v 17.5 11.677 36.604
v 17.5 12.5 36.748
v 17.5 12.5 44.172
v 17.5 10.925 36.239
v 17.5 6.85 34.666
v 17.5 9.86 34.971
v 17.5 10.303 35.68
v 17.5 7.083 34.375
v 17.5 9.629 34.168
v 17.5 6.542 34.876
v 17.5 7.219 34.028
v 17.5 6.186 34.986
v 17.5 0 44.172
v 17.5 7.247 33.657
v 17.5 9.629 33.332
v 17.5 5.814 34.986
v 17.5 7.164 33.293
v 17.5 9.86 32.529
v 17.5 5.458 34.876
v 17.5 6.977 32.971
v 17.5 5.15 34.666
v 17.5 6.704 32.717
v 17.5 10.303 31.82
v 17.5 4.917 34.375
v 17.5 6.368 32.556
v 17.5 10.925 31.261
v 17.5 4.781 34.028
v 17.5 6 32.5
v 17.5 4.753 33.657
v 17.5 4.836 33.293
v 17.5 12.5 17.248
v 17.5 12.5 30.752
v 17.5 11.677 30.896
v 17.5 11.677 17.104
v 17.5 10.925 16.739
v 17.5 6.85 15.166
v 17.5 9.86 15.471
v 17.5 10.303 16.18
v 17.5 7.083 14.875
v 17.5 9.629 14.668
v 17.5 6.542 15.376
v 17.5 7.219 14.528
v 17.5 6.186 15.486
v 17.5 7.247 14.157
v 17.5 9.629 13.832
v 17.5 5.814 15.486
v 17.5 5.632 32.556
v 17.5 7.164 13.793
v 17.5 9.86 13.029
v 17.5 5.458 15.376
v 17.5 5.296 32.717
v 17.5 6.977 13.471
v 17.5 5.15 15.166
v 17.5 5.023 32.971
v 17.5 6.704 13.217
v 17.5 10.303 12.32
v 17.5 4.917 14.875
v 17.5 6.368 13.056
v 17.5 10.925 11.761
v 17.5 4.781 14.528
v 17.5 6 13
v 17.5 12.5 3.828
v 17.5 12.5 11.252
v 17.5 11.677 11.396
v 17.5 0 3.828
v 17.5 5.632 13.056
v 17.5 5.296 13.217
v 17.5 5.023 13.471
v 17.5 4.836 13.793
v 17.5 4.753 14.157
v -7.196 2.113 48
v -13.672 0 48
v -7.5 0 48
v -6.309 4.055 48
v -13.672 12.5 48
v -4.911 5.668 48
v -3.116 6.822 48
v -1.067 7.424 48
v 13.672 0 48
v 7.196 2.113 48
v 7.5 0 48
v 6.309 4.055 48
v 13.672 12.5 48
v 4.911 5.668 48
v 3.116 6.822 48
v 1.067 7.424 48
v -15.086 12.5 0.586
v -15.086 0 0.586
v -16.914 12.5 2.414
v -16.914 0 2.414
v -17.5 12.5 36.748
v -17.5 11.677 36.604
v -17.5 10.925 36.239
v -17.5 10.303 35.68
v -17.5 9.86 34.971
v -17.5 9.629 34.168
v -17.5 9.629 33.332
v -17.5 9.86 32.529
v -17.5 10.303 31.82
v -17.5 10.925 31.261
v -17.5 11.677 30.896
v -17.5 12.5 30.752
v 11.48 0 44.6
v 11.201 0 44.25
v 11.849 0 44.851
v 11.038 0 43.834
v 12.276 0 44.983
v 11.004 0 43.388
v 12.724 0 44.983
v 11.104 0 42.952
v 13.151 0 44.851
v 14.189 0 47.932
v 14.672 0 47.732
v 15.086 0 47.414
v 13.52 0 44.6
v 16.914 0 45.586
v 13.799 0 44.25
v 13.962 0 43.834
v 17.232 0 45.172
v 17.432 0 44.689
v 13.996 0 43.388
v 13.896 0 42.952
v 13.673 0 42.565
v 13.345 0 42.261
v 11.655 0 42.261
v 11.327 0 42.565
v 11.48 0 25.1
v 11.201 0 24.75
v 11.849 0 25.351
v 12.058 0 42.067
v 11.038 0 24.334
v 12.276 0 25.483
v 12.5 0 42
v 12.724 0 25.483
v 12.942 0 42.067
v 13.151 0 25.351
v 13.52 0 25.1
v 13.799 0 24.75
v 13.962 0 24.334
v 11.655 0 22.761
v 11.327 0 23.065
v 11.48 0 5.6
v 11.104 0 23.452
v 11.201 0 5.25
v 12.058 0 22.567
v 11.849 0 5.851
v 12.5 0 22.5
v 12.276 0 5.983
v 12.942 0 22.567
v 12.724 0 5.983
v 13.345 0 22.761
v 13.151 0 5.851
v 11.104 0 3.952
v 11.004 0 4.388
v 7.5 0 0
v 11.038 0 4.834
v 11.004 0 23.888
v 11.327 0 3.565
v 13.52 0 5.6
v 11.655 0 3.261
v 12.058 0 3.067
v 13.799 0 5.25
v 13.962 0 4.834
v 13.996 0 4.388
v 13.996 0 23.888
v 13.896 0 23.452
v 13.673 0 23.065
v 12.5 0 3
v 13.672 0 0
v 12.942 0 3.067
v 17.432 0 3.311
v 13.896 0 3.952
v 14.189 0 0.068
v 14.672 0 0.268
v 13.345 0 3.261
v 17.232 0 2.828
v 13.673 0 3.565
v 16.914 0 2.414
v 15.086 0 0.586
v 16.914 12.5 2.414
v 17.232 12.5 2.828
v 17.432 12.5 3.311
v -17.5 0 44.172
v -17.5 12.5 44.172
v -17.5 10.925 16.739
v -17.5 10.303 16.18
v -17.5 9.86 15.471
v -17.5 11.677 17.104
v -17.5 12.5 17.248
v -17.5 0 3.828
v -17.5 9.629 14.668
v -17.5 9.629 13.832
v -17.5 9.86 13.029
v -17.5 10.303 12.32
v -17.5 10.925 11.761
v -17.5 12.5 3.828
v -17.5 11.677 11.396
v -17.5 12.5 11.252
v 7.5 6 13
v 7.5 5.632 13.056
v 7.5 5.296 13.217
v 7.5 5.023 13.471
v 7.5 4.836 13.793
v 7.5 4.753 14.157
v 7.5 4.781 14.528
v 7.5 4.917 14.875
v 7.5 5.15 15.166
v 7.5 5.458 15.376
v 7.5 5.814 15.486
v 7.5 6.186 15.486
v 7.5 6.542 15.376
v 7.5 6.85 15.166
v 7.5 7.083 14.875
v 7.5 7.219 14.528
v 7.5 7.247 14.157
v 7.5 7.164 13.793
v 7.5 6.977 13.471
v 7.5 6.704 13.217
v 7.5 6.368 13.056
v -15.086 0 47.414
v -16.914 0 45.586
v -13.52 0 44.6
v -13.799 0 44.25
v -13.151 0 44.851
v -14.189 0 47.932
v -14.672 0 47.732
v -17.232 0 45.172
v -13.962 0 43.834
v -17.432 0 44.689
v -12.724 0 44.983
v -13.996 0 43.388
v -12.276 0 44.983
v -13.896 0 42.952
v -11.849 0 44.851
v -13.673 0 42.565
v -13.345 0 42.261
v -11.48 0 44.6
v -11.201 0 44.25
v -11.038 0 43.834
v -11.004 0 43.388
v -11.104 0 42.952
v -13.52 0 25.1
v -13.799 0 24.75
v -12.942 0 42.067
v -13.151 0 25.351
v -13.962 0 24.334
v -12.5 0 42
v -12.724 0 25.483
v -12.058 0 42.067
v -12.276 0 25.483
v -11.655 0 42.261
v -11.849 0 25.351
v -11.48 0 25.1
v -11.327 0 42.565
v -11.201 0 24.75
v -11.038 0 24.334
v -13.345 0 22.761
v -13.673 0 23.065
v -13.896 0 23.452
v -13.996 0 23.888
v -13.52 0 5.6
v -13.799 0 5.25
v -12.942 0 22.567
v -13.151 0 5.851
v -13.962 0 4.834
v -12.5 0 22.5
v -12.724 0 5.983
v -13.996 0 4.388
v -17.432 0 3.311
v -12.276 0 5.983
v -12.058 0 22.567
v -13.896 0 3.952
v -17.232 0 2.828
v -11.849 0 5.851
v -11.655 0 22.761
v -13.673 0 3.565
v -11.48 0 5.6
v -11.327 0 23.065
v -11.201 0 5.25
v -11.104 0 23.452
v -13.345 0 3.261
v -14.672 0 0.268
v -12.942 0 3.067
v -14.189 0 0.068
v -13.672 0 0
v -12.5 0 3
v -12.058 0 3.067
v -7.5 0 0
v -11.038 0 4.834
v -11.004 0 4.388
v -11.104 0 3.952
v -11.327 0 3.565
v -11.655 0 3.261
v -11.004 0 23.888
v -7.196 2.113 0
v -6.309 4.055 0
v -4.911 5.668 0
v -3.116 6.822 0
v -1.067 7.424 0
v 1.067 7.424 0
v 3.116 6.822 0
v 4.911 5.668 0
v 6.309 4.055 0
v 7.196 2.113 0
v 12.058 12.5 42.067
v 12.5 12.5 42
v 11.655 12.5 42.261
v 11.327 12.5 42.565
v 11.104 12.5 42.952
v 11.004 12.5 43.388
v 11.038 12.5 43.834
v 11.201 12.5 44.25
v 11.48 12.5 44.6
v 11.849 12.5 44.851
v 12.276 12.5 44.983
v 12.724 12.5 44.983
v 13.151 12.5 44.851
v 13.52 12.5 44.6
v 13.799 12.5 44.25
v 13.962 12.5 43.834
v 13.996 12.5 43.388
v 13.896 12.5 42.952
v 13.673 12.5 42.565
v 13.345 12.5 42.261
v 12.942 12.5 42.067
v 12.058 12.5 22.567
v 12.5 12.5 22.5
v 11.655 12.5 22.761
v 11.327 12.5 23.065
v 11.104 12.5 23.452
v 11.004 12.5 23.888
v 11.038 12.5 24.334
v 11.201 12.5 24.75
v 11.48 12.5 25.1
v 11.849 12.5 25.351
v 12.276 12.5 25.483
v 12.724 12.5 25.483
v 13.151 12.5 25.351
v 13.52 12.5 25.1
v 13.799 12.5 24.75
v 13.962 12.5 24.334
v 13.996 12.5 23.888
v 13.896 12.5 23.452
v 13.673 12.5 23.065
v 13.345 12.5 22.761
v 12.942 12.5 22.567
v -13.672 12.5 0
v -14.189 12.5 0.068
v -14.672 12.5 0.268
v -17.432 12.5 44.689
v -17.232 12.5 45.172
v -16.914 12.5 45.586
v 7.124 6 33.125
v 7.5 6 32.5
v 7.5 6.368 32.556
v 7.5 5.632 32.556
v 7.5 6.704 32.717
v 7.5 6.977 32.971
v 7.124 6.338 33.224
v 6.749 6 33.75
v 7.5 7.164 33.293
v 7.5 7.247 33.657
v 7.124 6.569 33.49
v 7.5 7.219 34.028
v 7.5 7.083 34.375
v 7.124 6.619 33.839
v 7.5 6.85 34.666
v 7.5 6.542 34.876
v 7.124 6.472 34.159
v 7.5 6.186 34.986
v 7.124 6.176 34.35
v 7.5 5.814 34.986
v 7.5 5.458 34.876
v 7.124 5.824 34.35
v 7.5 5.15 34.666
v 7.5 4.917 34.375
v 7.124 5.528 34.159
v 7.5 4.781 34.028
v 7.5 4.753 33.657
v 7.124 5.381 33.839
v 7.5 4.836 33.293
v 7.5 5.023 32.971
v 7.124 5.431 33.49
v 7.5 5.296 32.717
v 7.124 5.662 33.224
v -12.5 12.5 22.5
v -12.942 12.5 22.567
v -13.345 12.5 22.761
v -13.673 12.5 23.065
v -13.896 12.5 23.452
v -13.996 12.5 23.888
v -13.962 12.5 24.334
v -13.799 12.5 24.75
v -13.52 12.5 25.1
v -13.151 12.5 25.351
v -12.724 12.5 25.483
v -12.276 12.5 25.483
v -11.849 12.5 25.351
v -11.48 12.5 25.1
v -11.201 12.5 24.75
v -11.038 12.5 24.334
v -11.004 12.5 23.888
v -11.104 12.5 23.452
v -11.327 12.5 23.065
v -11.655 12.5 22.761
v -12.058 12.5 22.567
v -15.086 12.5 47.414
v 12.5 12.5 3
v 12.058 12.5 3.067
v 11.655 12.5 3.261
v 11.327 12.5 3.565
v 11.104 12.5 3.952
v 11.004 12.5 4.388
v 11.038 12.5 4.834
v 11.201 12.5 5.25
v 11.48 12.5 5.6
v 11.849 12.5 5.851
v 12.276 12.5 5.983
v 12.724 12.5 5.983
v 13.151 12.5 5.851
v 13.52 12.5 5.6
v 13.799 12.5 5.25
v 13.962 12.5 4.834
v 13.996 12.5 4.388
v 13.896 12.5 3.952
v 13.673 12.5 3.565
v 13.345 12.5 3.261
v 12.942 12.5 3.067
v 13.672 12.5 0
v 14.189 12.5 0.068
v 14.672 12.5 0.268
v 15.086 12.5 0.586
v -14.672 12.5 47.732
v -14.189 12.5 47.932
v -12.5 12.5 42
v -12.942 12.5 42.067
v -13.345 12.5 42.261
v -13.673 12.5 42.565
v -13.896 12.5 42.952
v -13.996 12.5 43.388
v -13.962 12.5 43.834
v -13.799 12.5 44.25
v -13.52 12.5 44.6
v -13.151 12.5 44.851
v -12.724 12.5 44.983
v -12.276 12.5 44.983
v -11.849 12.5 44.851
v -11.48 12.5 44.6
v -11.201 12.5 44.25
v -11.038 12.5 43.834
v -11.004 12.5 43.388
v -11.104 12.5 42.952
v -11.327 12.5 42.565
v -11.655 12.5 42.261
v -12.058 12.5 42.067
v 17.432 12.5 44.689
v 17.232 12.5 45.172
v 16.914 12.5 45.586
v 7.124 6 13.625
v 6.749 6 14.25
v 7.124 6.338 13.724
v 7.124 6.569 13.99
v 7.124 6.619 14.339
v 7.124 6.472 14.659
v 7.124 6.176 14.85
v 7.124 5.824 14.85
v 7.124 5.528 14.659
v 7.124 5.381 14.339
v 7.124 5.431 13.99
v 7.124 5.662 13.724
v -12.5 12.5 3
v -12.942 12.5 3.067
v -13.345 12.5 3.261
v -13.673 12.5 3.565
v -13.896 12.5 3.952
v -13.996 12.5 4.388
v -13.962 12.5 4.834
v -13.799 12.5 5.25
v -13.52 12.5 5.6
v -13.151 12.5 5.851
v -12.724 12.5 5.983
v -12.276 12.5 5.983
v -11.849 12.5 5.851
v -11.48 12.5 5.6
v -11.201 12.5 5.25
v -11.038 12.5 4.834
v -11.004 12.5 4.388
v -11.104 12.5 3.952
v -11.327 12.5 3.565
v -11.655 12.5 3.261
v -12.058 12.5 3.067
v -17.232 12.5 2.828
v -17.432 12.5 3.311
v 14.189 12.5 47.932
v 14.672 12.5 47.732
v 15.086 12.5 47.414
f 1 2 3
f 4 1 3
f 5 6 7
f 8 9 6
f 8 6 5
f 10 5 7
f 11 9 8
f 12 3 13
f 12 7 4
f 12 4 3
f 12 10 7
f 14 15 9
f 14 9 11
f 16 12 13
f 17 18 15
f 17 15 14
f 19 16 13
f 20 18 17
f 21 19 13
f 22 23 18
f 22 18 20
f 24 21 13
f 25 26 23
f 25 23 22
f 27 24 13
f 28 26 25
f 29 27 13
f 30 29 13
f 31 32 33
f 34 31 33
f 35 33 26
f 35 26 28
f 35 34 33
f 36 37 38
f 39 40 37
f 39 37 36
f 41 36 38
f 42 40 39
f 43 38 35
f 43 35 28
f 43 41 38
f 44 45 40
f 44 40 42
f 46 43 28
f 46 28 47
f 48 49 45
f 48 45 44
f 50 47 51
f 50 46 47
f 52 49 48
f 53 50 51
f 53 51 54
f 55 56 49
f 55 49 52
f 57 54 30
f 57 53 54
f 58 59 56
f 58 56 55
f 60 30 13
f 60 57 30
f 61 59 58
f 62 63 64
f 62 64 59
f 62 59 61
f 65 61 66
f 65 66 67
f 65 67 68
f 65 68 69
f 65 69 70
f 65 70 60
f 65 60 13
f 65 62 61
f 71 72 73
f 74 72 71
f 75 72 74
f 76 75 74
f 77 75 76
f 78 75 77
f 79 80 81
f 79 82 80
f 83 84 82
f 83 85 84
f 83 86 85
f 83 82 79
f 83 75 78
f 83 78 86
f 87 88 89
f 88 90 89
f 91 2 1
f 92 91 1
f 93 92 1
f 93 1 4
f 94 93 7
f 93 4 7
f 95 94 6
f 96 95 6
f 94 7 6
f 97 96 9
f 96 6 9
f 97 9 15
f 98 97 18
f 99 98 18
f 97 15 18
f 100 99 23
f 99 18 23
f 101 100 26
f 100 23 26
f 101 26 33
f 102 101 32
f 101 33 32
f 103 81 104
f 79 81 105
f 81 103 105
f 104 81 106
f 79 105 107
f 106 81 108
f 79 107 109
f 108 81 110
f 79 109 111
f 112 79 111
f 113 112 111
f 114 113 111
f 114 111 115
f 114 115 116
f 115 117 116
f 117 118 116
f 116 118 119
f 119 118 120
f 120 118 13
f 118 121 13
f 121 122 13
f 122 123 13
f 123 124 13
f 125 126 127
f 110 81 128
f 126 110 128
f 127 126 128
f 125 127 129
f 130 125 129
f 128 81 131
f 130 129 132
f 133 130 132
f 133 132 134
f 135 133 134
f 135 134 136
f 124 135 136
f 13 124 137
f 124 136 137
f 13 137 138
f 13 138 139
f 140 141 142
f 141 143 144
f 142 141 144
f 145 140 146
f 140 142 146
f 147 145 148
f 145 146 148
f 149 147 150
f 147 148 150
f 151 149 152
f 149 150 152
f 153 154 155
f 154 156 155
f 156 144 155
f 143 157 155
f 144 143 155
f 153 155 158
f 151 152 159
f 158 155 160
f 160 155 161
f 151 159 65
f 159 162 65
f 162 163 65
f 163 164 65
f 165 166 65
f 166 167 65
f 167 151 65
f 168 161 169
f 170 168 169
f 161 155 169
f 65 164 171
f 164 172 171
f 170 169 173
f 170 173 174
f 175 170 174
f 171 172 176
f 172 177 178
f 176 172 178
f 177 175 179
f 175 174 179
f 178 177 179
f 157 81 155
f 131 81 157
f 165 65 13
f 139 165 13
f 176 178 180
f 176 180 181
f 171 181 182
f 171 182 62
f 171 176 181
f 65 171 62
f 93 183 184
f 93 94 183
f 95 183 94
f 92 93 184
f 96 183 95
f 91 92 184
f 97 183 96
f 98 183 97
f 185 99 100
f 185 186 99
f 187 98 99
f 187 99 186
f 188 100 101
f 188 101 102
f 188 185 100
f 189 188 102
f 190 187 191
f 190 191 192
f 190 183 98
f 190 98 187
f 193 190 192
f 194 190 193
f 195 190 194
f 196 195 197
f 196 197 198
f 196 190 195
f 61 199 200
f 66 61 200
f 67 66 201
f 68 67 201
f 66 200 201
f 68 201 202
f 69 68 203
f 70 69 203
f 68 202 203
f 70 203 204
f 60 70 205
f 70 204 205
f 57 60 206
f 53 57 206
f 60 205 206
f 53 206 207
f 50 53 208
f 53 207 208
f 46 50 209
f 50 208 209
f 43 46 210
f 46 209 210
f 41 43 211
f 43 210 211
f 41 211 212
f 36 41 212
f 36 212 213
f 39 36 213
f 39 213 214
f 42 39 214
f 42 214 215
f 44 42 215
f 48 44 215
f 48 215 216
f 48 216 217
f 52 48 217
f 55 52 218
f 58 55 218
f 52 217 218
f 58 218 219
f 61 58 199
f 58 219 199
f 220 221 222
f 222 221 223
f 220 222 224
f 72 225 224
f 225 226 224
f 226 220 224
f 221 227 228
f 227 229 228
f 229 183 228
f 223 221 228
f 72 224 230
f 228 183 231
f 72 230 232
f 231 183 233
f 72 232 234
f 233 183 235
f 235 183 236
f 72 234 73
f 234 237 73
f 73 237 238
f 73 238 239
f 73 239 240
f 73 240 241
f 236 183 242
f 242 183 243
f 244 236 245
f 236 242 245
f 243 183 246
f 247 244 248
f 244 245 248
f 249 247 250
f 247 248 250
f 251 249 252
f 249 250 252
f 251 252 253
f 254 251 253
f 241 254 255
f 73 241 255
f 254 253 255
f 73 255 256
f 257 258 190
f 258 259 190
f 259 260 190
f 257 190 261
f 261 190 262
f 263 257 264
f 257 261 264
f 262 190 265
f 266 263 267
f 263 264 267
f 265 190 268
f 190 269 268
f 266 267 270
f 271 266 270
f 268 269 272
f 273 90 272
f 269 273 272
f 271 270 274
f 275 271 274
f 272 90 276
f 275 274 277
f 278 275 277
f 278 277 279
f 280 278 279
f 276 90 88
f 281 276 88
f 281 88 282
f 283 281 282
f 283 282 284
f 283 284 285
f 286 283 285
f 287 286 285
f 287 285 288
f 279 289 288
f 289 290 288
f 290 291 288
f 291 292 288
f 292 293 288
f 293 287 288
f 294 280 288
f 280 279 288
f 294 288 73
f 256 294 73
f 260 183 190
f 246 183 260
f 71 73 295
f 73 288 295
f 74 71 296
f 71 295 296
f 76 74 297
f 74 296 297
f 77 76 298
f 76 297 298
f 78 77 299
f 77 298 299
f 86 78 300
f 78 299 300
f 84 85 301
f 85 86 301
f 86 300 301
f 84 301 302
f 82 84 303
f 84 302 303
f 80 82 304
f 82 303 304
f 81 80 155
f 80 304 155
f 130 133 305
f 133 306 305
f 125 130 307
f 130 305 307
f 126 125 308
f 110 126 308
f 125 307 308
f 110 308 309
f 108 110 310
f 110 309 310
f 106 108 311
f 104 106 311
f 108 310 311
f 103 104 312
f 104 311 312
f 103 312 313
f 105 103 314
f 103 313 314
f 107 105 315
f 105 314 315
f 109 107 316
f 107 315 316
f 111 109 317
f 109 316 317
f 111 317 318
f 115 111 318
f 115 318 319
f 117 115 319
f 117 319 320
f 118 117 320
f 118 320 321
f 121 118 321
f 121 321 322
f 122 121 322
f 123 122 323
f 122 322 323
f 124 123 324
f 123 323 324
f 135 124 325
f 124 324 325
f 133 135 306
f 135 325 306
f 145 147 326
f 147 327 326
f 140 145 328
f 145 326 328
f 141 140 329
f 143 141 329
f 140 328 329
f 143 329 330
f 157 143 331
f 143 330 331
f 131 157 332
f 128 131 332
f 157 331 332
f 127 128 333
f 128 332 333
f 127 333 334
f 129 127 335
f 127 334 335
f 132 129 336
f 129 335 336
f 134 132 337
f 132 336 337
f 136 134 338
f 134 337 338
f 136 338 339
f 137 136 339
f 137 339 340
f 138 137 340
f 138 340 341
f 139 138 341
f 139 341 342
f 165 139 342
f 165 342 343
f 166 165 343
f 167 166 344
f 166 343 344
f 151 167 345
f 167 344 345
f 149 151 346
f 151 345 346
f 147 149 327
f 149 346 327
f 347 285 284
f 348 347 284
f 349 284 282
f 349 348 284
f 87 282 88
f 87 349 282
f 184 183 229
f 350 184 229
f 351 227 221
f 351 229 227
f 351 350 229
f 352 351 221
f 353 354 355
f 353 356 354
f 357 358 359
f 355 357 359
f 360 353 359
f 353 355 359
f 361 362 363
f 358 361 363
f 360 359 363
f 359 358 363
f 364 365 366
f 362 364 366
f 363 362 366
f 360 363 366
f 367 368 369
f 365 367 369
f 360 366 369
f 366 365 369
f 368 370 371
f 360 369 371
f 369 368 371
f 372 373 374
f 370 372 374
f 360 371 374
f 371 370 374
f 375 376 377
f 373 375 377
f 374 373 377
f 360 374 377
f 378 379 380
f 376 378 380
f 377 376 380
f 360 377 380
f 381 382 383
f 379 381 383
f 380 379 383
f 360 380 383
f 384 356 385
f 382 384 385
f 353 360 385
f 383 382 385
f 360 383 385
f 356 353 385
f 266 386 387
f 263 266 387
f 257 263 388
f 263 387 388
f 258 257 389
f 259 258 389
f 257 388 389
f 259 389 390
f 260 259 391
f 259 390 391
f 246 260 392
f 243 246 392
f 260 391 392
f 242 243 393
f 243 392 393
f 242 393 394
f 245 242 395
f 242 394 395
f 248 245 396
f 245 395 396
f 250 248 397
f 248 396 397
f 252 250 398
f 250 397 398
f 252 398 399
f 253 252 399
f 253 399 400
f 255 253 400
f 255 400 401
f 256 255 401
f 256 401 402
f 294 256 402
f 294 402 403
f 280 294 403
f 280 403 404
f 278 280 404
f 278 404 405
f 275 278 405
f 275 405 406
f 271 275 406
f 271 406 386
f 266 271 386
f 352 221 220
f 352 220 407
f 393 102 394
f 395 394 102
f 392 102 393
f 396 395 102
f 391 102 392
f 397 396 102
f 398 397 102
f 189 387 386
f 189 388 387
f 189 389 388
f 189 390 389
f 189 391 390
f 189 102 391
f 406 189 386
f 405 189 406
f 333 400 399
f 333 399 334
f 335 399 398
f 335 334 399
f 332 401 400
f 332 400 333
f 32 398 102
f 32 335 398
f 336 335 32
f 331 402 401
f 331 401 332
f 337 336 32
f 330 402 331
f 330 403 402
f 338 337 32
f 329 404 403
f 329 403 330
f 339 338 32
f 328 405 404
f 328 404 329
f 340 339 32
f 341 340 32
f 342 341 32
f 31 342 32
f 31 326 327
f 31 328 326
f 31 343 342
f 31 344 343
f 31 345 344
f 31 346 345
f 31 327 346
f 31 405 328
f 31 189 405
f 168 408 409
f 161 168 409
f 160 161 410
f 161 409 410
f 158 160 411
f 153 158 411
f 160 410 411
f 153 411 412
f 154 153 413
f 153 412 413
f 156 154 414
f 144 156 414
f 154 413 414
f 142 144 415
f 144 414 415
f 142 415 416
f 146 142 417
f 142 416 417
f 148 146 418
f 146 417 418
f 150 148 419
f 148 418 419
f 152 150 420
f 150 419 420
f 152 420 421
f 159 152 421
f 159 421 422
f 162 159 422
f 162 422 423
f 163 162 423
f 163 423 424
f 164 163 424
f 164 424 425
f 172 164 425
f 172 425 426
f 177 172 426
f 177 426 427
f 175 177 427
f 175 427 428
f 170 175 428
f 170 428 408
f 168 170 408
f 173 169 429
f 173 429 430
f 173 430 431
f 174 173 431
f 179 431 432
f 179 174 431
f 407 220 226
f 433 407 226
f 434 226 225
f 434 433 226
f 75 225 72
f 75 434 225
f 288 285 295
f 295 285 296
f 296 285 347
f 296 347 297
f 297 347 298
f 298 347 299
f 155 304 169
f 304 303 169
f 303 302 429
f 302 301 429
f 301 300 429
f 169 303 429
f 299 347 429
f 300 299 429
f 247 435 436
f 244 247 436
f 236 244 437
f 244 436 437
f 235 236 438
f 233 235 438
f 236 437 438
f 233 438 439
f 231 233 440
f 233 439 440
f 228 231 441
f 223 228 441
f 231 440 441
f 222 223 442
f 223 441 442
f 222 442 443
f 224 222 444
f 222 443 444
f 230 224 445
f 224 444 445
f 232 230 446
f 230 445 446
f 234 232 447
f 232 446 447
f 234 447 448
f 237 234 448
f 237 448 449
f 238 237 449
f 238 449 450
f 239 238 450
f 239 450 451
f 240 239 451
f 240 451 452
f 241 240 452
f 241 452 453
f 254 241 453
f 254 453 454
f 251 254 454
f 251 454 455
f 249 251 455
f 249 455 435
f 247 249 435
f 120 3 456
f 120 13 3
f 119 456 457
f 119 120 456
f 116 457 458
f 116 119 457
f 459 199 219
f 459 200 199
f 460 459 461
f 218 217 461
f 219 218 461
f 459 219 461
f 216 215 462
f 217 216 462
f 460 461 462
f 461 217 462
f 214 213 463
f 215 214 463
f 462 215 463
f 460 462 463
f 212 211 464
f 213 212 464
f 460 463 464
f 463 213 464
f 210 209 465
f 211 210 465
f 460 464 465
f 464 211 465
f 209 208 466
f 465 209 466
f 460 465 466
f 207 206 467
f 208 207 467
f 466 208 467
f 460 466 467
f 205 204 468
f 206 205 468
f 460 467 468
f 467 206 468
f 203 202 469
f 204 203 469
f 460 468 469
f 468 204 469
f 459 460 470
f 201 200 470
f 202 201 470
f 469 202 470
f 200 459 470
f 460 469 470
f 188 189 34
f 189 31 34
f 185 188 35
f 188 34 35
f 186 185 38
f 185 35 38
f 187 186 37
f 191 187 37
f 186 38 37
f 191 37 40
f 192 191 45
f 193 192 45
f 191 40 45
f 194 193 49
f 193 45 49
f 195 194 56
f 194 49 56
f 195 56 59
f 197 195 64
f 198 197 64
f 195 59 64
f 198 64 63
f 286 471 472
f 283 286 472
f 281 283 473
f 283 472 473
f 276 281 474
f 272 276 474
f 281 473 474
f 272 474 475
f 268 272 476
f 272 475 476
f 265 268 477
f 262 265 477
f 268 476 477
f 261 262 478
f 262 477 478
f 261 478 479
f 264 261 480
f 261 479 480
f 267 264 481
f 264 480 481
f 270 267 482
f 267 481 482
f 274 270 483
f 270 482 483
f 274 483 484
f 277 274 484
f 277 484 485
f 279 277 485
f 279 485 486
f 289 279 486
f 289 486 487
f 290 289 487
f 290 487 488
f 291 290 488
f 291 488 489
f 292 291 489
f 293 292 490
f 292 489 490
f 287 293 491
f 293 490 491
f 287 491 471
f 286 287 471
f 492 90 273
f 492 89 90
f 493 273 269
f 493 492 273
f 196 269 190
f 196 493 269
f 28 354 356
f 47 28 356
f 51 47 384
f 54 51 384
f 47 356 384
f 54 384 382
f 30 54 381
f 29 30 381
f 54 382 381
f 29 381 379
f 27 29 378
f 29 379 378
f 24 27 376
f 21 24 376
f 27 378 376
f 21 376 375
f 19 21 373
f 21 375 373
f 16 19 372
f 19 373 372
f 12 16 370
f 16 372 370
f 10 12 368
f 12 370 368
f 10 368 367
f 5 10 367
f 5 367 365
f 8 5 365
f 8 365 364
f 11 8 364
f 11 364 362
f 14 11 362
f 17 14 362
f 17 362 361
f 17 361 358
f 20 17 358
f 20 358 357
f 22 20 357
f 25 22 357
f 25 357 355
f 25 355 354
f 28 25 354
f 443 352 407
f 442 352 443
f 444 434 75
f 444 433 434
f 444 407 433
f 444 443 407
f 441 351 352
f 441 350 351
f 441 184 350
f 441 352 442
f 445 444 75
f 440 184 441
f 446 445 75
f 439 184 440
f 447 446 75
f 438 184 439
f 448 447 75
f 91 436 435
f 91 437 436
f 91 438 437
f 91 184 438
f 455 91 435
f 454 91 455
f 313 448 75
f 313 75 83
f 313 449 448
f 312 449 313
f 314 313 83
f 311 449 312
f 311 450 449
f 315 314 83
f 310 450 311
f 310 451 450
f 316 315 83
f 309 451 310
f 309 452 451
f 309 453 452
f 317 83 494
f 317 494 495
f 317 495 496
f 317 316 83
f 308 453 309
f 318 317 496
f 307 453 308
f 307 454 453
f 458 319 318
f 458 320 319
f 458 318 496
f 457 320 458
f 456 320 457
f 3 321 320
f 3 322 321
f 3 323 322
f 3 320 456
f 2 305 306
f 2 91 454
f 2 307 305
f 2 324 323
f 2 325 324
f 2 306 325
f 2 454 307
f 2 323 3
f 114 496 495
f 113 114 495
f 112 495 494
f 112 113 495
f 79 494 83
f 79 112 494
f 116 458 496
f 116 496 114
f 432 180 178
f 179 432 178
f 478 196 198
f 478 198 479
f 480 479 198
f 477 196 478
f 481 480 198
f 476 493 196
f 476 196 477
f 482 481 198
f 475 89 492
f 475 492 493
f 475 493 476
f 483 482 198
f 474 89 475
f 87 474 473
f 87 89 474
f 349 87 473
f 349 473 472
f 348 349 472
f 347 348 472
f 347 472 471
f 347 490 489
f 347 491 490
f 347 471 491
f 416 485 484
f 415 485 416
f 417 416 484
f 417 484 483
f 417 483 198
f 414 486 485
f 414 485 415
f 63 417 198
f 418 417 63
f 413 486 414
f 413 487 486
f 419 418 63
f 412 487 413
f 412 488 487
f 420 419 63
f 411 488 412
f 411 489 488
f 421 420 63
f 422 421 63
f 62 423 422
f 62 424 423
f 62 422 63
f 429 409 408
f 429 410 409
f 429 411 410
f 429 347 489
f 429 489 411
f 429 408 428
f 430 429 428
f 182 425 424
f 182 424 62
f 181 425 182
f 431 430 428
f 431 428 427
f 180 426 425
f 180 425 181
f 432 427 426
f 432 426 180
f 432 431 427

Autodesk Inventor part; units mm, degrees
ref_plane "YZ Plane" through (0, 0, 0) normal (1, 0, 0) x (0, 1, 0)
ref_plane "XZ Plane" through (0, 0, 0) normal (0, 1, 0) x (-1, 0, 0)
ref_plane "XY Plane" through (0, 0, 0) normal (0, 0, 1) x (1, 0, 0)
sketch "Sketch1" plane through (0, 0, 0) normal (0, 0, 1) x (1, 0, 0)
  circle A0 centre (0, 0) radius 7.5
  line L0 (-17.5, 0) -> (-7.5, 0)
  line L1 (7.5, 0) -> (17.5, 0)
  line L2 (-17.5, 0) -> (-17.5, 12.5)
  line L3 (-17.5, 12.5) -> (17.5, 12.5)
  line L4 (17.5, 12.5) -> (17.5, 0)
  dimension "d5" = 15
  dimension "d6" = 0
  dimension "d8" = 0
  dimension "d11" = 10
  dimension "d13" = 10
  dimension "d19" = 12.5
  dimension "d76" = 35
extrude "Extrusion1" add sketch "Sketch1" along normal blind 48 contours A0 L0 L2 L3 L4 L1
sketch "Sketch3" plane through (7.5, 0, 0) normal (0, -1, 0) x (1, 0, 0)
  line L0 (10, 0) -> (10, 48) projected
  line L1 (0, 48) -> (10, 48) projected
  line L2 (0, 0) -> (0, 48) projected
  line L3 (0, 0) -> (10, 0) projected
  line L4 (-25, 0) -> (-15, 0) projected
  line L5 (-15, 0) -> (-15, 48) projected
  line L6 (-25, 48) -> (-15, 48) projected
  line L7 (-25, 0) -> (-25, 48) projected
  point P0 (-7.5, 0)
  point P1 (5, 4.5)
  point P2 (5, 24)
  point P3 (5, 43.5)
  point P4 (-20, 43.5)
  point P5 (-20, 4.5)
  point P6 (-20, 24)
  dimension "d31" = 48
  dimension "d35" = 5
  dimension "d44" = 4.5
  dimension "d45" = 4.5
  dimension "d46" = 24
  dimension "d47" = 5
  dimension "d48" = 10
  dimension "d49" = 10
hole "Hole1" at (12.5, 0, 4.5) at (12.5, 0, 24) at (12.5, 0, 43.5) at (-12.5, 0, 43.5) at (-12.5, 0, 4.5) at (-12.5, 0, 24) direction (0, 1, 0) diameter 3 end through all
sketch "Sketch4" plane through (17.5, 0, 0) normal (1, 0, 0) x (0, 0, -1)
  line L0 (0, 0) -> (0, 12.5) projected
  line L1 (0, 12.5) -> (-48, 12.5) projected
  line L2 (-48, 0) -> (-48, 12.5) projected
  line L3 (0, 0) -> (-48, 0) projected
  line L4 (0, 12.5) -> (-48, 12.5) projected
  circle A0 centre (-33.75, 12.6) radius 3
  circle A1 centre (-14.25, 12.6) radius 3
  dimension "d54" = 6
  dimension "d55" = 6
  dimension "d56" = 14.25
  dimension "d57" = 14.25
  dimension "d58" = 0.1
  dimension "d59" = 0.1
extrude "Extrusion3" cut sketch "Sketch4" against normal through all contours A1 L1 | L1 A1 | A0 L1 | L1 A0
chamfer "Chamfer1" distance 3 angle 45 4 edges at (17.5, 6.25, 48) (-17.5, 6.25, 48) (17.5, 6.25, 0) (-17.5, 6.25, 0)
fillet "Fillet2" radius 2 8 edges at (17.5, 6.25, 45) (14.5, 6.25, 48) (-14.5, 6.25, 48) (-17.5, 6.25, 45) (-17.5, 6.25, 3) (-14.5, 6.25, 0) (14.5, 6.25, 0) (17.5, 6.25, 3)
sketch "Sketch5" plane through (17.5, 12.5, 30.7517) normal (1, 0, 0) x (0, 0, -1)
  line L0 (-17.2483, 0) -> (-17.2483, -12.5) projected
  line L1 (30.7517, -12.5) -> (30.7517, 0) projected
  line L2 (26.9232, -12.5) -> (-13.4199, -12.5) projected
  point P0 (-2.9983, -6.5)
  point P1 (16.5017, -6.5)
  dimension "d66" = 6
  dimension "d67" = 14.25
  dimension "d68" = 14.25
hole "Hole2" at (17.5, 6, 33.75) at (17.5, 6, 14.25) direction (-1, 0, 0) diameter 2.5 depth 10 tip angle 118
equation "\"d13\" = d11"
equation "\"d35\" = 0.5 * d48"
equation "\"d45\" = d44"
equation "\"d46\" = 0.5 * d31"
equation "\"d47\" = d35"
equation "\"d57\" = d56"
equation "\"d68\" = d67"
properties part number "3DP_PLA_X_end_top_half" material "ABS Plastic"
